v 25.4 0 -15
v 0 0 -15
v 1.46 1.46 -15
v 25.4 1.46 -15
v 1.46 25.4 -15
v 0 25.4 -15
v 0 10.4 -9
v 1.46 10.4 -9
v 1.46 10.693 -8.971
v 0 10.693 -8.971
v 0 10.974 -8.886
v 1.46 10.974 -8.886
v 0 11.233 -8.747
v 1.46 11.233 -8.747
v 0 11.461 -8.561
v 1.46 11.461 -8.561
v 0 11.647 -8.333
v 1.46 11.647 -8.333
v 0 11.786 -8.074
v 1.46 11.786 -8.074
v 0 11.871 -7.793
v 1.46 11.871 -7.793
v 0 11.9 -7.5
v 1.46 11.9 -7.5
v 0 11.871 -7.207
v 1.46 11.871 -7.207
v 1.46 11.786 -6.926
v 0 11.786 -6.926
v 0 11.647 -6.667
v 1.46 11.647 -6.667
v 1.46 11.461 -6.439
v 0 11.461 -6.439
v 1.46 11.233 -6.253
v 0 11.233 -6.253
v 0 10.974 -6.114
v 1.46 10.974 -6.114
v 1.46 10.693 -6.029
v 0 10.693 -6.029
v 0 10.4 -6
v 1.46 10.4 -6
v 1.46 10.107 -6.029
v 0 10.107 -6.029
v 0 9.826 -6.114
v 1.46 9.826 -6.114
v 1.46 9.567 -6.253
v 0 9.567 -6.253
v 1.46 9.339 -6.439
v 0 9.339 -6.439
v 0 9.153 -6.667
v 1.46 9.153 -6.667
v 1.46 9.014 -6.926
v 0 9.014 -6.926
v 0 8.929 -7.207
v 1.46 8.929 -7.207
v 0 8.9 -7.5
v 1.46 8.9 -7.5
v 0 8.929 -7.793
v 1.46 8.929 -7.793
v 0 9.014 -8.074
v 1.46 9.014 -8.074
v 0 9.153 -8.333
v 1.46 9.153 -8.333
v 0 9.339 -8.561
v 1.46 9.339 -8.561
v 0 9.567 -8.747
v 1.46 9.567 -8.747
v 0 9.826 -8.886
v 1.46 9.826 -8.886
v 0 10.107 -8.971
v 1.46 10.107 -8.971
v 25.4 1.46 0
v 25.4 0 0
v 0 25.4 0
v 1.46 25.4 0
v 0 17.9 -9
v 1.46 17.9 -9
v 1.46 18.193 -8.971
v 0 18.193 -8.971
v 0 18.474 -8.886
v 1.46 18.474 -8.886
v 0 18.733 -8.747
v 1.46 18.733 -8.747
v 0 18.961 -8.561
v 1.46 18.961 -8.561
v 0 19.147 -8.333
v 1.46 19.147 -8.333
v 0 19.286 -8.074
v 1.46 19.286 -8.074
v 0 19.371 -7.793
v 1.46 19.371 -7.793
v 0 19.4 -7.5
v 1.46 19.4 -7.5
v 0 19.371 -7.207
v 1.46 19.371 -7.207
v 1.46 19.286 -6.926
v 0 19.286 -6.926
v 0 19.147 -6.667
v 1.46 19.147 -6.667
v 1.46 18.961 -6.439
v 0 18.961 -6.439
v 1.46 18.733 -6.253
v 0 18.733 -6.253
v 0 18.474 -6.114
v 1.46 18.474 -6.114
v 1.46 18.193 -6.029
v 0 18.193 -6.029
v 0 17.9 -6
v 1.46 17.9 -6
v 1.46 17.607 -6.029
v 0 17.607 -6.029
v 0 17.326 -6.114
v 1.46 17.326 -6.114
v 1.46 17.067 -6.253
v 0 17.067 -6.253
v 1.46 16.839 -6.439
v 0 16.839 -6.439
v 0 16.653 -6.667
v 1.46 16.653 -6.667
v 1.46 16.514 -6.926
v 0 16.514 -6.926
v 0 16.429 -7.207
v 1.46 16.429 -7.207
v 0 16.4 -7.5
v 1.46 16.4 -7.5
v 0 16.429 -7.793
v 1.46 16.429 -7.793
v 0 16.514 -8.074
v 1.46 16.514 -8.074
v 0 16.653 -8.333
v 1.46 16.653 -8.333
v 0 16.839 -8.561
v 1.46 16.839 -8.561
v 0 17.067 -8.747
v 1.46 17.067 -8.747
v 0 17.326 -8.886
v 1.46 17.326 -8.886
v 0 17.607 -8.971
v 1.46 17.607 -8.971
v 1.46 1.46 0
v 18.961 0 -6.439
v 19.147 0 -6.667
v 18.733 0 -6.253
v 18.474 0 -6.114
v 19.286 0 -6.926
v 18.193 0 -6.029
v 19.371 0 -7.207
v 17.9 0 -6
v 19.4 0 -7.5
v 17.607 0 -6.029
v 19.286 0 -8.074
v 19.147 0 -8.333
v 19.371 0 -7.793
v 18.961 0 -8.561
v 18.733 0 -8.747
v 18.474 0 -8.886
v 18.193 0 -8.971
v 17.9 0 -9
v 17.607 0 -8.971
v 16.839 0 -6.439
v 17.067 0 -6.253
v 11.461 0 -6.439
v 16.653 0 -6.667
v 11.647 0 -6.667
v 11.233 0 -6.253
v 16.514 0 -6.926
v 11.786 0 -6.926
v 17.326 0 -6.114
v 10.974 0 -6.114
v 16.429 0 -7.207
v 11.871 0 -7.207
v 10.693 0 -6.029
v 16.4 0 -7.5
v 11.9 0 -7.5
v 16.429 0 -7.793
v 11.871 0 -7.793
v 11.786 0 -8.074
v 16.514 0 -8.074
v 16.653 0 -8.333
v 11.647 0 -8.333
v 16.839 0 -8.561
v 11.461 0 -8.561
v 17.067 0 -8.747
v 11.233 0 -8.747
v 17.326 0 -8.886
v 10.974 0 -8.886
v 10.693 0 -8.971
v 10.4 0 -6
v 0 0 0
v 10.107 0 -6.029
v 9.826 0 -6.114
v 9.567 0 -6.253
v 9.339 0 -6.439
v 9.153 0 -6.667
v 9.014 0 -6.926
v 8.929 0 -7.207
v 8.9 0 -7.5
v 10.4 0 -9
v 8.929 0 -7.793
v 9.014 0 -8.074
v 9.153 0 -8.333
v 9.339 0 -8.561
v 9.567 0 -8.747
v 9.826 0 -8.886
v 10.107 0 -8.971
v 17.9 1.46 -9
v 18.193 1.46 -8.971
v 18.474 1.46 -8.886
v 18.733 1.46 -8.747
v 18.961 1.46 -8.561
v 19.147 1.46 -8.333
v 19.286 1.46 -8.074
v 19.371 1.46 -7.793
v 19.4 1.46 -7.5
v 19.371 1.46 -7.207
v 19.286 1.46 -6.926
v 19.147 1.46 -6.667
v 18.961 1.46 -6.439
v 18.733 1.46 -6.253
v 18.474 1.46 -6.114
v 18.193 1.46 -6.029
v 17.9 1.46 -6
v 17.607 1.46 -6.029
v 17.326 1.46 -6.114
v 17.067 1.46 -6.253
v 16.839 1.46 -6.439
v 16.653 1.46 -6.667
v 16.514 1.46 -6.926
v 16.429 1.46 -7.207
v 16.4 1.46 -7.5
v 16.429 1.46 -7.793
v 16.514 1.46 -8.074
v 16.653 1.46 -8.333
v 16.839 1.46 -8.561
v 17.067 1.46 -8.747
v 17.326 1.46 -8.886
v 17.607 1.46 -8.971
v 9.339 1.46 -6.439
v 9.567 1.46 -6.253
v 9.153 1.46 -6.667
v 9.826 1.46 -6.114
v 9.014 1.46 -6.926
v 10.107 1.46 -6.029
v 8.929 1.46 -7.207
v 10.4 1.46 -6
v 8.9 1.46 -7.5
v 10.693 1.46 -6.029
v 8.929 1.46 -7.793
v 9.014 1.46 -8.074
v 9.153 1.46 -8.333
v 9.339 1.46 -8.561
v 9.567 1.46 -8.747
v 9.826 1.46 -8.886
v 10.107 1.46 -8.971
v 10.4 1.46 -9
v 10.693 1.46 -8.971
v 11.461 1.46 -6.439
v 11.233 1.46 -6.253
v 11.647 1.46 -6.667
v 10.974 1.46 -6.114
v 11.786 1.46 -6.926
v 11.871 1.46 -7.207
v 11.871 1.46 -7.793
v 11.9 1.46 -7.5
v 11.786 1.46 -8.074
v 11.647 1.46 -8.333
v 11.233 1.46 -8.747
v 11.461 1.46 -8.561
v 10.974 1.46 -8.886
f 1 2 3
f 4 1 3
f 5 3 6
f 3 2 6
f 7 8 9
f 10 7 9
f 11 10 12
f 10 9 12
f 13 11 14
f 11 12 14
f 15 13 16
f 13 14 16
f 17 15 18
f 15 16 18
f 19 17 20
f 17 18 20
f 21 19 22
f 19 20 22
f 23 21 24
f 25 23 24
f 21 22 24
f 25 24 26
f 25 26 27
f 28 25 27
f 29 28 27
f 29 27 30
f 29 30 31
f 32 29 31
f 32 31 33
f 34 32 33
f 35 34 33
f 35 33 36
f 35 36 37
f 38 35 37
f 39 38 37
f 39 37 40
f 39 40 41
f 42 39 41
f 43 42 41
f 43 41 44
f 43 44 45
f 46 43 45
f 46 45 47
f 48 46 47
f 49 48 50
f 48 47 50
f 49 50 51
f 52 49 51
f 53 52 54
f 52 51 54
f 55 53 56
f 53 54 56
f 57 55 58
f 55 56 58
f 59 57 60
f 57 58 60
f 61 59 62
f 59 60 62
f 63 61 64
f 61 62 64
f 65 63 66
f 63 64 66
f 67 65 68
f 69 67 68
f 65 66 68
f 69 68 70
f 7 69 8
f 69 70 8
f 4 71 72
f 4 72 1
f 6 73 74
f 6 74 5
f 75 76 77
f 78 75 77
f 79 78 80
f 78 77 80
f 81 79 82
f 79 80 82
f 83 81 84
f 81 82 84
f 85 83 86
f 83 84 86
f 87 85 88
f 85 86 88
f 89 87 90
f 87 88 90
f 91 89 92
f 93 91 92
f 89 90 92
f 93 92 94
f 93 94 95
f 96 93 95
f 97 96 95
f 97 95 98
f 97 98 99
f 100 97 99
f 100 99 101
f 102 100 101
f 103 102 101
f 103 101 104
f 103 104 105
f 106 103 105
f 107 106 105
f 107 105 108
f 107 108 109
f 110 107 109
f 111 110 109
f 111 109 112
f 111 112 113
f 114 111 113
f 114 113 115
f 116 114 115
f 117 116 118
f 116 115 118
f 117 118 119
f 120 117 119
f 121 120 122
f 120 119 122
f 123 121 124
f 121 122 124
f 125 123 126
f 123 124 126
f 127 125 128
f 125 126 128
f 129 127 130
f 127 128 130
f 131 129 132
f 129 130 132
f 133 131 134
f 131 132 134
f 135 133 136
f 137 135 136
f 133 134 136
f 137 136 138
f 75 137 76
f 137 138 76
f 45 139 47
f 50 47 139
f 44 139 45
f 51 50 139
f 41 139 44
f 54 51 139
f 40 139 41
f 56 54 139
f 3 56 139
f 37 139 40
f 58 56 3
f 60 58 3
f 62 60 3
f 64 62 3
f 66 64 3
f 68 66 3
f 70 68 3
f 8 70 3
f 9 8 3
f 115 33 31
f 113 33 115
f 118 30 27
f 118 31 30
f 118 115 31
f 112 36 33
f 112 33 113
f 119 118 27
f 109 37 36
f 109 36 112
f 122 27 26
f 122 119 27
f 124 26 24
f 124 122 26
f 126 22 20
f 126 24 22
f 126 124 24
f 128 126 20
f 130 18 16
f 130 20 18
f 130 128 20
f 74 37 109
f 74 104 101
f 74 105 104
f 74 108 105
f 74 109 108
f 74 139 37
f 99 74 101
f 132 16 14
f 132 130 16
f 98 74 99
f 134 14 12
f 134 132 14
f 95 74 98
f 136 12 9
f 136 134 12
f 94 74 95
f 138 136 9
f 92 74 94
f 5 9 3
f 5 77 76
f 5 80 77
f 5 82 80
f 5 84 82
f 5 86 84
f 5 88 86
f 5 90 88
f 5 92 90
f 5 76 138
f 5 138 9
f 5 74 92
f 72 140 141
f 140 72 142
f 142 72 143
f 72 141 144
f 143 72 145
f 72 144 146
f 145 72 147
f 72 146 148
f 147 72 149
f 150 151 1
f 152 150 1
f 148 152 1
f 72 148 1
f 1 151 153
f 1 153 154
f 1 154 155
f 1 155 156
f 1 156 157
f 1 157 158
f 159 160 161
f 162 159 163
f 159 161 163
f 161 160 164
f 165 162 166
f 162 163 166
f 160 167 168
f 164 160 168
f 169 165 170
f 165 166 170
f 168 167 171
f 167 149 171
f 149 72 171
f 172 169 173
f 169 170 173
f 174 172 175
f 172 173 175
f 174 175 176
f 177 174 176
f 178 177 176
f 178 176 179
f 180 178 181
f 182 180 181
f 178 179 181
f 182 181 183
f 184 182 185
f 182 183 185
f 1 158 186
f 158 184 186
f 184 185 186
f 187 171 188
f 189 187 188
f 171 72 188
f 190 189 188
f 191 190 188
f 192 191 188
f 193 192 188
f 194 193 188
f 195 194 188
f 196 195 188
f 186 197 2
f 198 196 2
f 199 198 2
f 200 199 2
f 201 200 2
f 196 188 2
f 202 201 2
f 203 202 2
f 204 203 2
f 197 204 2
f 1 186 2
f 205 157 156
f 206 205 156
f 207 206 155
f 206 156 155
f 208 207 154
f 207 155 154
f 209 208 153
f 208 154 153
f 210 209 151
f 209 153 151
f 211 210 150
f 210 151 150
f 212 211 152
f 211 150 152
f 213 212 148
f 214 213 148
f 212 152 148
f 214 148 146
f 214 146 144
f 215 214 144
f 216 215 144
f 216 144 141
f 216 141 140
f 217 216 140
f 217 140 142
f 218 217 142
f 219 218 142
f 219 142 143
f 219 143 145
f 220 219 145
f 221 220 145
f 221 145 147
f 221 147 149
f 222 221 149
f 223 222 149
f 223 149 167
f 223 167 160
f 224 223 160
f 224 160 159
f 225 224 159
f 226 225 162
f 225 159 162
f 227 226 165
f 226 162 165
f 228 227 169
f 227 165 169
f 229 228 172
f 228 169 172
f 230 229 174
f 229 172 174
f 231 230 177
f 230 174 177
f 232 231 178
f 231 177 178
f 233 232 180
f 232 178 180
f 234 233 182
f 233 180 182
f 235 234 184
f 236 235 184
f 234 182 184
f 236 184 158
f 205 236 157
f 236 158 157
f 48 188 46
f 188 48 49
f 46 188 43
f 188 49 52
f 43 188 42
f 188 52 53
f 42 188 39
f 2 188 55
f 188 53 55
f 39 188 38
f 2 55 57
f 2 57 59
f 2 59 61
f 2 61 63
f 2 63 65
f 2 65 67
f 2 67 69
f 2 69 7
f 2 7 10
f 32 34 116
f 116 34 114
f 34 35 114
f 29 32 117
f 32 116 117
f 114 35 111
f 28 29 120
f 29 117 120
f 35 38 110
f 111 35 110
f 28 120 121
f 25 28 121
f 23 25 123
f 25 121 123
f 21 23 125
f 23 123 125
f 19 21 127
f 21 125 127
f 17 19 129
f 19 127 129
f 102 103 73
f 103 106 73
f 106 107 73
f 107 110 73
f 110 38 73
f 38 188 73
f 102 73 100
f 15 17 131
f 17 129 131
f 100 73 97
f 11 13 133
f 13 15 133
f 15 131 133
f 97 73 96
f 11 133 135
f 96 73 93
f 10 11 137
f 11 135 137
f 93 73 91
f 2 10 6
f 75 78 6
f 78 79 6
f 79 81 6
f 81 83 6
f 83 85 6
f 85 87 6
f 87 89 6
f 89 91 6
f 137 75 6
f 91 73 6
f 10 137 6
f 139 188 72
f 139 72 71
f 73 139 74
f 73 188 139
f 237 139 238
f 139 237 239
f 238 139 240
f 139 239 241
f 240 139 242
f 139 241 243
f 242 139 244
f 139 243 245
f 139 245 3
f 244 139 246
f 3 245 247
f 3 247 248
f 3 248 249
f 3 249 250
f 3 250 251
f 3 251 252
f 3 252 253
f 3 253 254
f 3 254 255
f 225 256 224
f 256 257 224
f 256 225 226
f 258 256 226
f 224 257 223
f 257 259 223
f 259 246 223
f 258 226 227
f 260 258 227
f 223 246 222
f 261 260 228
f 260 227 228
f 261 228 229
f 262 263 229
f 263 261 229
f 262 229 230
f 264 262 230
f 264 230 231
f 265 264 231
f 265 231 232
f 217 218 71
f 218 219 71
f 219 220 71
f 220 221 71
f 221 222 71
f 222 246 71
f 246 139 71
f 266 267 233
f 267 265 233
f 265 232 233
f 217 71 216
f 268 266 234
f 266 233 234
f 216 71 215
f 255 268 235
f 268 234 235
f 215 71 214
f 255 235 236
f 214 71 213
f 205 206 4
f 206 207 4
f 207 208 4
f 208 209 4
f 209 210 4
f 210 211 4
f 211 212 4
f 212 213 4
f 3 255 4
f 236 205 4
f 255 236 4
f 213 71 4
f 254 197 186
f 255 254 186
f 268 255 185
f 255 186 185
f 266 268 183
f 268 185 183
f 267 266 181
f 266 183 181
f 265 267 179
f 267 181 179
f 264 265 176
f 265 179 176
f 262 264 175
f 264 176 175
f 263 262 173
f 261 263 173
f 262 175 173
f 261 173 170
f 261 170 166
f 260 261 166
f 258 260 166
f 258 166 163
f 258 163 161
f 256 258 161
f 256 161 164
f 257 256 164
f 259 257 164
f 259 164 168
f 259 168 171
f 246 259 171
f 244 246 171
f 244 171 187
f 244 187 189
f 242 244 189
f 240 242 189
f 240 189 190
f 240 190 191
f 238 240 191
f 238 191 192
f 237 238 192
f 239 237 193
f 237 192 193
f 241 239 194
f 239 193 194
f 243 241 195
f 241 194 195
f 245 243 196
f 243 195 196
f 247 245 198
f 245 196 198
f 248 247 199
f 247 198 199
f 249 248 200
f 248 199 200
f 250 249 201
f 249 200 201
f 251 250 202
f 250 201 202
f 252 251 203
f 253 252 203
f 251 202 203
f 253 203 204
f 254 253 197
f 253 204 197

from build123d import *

# Parameters (mm, degrees)
SKETCH1_W           = 15
SKETCH1_H           = 25.4
BOSS_EXTRUDE1_DEPTH = 3.175
SKETCH2_W           = 15
SKETCH2_H           = 3.175
BOSS_EXTRUDE2_DEPTH = 22.225
SKETCH4_R           = 1.5
CUT_EXTRUDE3_DEPTH  = 37.933868265
SKETCH3_R           = 1.5
CUT_EXTRUDE4_DEPTH  = 39.927111375
SKETCH7_W           = 22.225
SKETCH7_H           = 15
CUT_EXTRUDE7_DEPTH  = 1.7145
SKETCH8_W           = 15
SKETCH8_H           = 23.9395
CUT_EXTRUDE8_DEPTH  = 1.7145


with BuildPart() as part:
    # Sketch1 → Boss-Extrude1 (new body)
    with BuildSketch(Plane(origin=(0, 0, 0), x_dir=(0, 0, -1), z_dir=(1, 0, 0))):
        with Locations((7.5, 12.7)):
            Rectangle(SKETCH1_W, SKETCH1_H)
    extrude(amount=BOSS_EXTRUDE1_DEPTH)

    # Sketch2 → Boss-Extrude2 (add)
    with BuildSketch(Plane(origin=(3.175, 0, 0), x_dir=(0, 0, -1), z_dir=(1, 0, 0))):
        with Locations((7.5, 1.5875)):
            Rectangle(SKETCH2_W, SKETCH2_H)
    extrude(amount=BOSS_EXTRUDE2_DEPTH)

    # Sketch4 → Cut-Extrude3 (cut, through all)
    with BuildSketch(Plane(origin=(3.175, 0, 0), x_dir=(0, 0, -1), z_dir=(1, 0, 0))):
        with Locations((7.5, 17.9)):
            Circle(SKETCH4_R)
        with Locations((7.5, 10.4)):
            Circle(SKETCH4_R)
    extrude(amount=-CUT_EXTRUDE3_DEPTH, mode=Mode.SUBTRACT)

    # Sketch3 → Cut-Extrude4 (cut, through all)
    with BuildSketch(Plane.XZ):
        with Locations(Location((10.4, -7.5, 0), (0, 0, 270))):
            Circle(SKETCH3_R)
        with Locations(Location((17.9, -7.5, 0), (0, 0, 270))):
            Circle(SKETCH3_R)
    extrude(amount=-CUT_EXTRUDE4_DEPTH, mode=Mode.SUBTRACT)

    # Sketch7 → Cut-Extrude7 (cut)
    with BuildSketch(Plane(origin=(0, 3.175, 0), x_dir=(1, 0, 0), z_dir=(0, 1, 0))):
        with Locations((14.2875, 7.5)):
            Rectangle(SKETCH7_W, SKETCH7_H)
    extrude(amount=-CUT_EXTRUDE7_DEPTH, mode=Mode.SUBTRACT)

    # Sketch8 → Cut-Extrude8 (cut)
    with BuildSketch(Plane(origin=(3.175, 0, 0), x_dir=(0, 0, -1), z_dir=(1, 0, 0))):
        with Locations((7.5, 13.43025)):
            Rectangle(SKETCH8_W, SKETCH8_H)
    extrude(amount=-CUT_EXTRUDE8_DEPTH, mode=Mode.SUBTRACT)


solid = part.part
